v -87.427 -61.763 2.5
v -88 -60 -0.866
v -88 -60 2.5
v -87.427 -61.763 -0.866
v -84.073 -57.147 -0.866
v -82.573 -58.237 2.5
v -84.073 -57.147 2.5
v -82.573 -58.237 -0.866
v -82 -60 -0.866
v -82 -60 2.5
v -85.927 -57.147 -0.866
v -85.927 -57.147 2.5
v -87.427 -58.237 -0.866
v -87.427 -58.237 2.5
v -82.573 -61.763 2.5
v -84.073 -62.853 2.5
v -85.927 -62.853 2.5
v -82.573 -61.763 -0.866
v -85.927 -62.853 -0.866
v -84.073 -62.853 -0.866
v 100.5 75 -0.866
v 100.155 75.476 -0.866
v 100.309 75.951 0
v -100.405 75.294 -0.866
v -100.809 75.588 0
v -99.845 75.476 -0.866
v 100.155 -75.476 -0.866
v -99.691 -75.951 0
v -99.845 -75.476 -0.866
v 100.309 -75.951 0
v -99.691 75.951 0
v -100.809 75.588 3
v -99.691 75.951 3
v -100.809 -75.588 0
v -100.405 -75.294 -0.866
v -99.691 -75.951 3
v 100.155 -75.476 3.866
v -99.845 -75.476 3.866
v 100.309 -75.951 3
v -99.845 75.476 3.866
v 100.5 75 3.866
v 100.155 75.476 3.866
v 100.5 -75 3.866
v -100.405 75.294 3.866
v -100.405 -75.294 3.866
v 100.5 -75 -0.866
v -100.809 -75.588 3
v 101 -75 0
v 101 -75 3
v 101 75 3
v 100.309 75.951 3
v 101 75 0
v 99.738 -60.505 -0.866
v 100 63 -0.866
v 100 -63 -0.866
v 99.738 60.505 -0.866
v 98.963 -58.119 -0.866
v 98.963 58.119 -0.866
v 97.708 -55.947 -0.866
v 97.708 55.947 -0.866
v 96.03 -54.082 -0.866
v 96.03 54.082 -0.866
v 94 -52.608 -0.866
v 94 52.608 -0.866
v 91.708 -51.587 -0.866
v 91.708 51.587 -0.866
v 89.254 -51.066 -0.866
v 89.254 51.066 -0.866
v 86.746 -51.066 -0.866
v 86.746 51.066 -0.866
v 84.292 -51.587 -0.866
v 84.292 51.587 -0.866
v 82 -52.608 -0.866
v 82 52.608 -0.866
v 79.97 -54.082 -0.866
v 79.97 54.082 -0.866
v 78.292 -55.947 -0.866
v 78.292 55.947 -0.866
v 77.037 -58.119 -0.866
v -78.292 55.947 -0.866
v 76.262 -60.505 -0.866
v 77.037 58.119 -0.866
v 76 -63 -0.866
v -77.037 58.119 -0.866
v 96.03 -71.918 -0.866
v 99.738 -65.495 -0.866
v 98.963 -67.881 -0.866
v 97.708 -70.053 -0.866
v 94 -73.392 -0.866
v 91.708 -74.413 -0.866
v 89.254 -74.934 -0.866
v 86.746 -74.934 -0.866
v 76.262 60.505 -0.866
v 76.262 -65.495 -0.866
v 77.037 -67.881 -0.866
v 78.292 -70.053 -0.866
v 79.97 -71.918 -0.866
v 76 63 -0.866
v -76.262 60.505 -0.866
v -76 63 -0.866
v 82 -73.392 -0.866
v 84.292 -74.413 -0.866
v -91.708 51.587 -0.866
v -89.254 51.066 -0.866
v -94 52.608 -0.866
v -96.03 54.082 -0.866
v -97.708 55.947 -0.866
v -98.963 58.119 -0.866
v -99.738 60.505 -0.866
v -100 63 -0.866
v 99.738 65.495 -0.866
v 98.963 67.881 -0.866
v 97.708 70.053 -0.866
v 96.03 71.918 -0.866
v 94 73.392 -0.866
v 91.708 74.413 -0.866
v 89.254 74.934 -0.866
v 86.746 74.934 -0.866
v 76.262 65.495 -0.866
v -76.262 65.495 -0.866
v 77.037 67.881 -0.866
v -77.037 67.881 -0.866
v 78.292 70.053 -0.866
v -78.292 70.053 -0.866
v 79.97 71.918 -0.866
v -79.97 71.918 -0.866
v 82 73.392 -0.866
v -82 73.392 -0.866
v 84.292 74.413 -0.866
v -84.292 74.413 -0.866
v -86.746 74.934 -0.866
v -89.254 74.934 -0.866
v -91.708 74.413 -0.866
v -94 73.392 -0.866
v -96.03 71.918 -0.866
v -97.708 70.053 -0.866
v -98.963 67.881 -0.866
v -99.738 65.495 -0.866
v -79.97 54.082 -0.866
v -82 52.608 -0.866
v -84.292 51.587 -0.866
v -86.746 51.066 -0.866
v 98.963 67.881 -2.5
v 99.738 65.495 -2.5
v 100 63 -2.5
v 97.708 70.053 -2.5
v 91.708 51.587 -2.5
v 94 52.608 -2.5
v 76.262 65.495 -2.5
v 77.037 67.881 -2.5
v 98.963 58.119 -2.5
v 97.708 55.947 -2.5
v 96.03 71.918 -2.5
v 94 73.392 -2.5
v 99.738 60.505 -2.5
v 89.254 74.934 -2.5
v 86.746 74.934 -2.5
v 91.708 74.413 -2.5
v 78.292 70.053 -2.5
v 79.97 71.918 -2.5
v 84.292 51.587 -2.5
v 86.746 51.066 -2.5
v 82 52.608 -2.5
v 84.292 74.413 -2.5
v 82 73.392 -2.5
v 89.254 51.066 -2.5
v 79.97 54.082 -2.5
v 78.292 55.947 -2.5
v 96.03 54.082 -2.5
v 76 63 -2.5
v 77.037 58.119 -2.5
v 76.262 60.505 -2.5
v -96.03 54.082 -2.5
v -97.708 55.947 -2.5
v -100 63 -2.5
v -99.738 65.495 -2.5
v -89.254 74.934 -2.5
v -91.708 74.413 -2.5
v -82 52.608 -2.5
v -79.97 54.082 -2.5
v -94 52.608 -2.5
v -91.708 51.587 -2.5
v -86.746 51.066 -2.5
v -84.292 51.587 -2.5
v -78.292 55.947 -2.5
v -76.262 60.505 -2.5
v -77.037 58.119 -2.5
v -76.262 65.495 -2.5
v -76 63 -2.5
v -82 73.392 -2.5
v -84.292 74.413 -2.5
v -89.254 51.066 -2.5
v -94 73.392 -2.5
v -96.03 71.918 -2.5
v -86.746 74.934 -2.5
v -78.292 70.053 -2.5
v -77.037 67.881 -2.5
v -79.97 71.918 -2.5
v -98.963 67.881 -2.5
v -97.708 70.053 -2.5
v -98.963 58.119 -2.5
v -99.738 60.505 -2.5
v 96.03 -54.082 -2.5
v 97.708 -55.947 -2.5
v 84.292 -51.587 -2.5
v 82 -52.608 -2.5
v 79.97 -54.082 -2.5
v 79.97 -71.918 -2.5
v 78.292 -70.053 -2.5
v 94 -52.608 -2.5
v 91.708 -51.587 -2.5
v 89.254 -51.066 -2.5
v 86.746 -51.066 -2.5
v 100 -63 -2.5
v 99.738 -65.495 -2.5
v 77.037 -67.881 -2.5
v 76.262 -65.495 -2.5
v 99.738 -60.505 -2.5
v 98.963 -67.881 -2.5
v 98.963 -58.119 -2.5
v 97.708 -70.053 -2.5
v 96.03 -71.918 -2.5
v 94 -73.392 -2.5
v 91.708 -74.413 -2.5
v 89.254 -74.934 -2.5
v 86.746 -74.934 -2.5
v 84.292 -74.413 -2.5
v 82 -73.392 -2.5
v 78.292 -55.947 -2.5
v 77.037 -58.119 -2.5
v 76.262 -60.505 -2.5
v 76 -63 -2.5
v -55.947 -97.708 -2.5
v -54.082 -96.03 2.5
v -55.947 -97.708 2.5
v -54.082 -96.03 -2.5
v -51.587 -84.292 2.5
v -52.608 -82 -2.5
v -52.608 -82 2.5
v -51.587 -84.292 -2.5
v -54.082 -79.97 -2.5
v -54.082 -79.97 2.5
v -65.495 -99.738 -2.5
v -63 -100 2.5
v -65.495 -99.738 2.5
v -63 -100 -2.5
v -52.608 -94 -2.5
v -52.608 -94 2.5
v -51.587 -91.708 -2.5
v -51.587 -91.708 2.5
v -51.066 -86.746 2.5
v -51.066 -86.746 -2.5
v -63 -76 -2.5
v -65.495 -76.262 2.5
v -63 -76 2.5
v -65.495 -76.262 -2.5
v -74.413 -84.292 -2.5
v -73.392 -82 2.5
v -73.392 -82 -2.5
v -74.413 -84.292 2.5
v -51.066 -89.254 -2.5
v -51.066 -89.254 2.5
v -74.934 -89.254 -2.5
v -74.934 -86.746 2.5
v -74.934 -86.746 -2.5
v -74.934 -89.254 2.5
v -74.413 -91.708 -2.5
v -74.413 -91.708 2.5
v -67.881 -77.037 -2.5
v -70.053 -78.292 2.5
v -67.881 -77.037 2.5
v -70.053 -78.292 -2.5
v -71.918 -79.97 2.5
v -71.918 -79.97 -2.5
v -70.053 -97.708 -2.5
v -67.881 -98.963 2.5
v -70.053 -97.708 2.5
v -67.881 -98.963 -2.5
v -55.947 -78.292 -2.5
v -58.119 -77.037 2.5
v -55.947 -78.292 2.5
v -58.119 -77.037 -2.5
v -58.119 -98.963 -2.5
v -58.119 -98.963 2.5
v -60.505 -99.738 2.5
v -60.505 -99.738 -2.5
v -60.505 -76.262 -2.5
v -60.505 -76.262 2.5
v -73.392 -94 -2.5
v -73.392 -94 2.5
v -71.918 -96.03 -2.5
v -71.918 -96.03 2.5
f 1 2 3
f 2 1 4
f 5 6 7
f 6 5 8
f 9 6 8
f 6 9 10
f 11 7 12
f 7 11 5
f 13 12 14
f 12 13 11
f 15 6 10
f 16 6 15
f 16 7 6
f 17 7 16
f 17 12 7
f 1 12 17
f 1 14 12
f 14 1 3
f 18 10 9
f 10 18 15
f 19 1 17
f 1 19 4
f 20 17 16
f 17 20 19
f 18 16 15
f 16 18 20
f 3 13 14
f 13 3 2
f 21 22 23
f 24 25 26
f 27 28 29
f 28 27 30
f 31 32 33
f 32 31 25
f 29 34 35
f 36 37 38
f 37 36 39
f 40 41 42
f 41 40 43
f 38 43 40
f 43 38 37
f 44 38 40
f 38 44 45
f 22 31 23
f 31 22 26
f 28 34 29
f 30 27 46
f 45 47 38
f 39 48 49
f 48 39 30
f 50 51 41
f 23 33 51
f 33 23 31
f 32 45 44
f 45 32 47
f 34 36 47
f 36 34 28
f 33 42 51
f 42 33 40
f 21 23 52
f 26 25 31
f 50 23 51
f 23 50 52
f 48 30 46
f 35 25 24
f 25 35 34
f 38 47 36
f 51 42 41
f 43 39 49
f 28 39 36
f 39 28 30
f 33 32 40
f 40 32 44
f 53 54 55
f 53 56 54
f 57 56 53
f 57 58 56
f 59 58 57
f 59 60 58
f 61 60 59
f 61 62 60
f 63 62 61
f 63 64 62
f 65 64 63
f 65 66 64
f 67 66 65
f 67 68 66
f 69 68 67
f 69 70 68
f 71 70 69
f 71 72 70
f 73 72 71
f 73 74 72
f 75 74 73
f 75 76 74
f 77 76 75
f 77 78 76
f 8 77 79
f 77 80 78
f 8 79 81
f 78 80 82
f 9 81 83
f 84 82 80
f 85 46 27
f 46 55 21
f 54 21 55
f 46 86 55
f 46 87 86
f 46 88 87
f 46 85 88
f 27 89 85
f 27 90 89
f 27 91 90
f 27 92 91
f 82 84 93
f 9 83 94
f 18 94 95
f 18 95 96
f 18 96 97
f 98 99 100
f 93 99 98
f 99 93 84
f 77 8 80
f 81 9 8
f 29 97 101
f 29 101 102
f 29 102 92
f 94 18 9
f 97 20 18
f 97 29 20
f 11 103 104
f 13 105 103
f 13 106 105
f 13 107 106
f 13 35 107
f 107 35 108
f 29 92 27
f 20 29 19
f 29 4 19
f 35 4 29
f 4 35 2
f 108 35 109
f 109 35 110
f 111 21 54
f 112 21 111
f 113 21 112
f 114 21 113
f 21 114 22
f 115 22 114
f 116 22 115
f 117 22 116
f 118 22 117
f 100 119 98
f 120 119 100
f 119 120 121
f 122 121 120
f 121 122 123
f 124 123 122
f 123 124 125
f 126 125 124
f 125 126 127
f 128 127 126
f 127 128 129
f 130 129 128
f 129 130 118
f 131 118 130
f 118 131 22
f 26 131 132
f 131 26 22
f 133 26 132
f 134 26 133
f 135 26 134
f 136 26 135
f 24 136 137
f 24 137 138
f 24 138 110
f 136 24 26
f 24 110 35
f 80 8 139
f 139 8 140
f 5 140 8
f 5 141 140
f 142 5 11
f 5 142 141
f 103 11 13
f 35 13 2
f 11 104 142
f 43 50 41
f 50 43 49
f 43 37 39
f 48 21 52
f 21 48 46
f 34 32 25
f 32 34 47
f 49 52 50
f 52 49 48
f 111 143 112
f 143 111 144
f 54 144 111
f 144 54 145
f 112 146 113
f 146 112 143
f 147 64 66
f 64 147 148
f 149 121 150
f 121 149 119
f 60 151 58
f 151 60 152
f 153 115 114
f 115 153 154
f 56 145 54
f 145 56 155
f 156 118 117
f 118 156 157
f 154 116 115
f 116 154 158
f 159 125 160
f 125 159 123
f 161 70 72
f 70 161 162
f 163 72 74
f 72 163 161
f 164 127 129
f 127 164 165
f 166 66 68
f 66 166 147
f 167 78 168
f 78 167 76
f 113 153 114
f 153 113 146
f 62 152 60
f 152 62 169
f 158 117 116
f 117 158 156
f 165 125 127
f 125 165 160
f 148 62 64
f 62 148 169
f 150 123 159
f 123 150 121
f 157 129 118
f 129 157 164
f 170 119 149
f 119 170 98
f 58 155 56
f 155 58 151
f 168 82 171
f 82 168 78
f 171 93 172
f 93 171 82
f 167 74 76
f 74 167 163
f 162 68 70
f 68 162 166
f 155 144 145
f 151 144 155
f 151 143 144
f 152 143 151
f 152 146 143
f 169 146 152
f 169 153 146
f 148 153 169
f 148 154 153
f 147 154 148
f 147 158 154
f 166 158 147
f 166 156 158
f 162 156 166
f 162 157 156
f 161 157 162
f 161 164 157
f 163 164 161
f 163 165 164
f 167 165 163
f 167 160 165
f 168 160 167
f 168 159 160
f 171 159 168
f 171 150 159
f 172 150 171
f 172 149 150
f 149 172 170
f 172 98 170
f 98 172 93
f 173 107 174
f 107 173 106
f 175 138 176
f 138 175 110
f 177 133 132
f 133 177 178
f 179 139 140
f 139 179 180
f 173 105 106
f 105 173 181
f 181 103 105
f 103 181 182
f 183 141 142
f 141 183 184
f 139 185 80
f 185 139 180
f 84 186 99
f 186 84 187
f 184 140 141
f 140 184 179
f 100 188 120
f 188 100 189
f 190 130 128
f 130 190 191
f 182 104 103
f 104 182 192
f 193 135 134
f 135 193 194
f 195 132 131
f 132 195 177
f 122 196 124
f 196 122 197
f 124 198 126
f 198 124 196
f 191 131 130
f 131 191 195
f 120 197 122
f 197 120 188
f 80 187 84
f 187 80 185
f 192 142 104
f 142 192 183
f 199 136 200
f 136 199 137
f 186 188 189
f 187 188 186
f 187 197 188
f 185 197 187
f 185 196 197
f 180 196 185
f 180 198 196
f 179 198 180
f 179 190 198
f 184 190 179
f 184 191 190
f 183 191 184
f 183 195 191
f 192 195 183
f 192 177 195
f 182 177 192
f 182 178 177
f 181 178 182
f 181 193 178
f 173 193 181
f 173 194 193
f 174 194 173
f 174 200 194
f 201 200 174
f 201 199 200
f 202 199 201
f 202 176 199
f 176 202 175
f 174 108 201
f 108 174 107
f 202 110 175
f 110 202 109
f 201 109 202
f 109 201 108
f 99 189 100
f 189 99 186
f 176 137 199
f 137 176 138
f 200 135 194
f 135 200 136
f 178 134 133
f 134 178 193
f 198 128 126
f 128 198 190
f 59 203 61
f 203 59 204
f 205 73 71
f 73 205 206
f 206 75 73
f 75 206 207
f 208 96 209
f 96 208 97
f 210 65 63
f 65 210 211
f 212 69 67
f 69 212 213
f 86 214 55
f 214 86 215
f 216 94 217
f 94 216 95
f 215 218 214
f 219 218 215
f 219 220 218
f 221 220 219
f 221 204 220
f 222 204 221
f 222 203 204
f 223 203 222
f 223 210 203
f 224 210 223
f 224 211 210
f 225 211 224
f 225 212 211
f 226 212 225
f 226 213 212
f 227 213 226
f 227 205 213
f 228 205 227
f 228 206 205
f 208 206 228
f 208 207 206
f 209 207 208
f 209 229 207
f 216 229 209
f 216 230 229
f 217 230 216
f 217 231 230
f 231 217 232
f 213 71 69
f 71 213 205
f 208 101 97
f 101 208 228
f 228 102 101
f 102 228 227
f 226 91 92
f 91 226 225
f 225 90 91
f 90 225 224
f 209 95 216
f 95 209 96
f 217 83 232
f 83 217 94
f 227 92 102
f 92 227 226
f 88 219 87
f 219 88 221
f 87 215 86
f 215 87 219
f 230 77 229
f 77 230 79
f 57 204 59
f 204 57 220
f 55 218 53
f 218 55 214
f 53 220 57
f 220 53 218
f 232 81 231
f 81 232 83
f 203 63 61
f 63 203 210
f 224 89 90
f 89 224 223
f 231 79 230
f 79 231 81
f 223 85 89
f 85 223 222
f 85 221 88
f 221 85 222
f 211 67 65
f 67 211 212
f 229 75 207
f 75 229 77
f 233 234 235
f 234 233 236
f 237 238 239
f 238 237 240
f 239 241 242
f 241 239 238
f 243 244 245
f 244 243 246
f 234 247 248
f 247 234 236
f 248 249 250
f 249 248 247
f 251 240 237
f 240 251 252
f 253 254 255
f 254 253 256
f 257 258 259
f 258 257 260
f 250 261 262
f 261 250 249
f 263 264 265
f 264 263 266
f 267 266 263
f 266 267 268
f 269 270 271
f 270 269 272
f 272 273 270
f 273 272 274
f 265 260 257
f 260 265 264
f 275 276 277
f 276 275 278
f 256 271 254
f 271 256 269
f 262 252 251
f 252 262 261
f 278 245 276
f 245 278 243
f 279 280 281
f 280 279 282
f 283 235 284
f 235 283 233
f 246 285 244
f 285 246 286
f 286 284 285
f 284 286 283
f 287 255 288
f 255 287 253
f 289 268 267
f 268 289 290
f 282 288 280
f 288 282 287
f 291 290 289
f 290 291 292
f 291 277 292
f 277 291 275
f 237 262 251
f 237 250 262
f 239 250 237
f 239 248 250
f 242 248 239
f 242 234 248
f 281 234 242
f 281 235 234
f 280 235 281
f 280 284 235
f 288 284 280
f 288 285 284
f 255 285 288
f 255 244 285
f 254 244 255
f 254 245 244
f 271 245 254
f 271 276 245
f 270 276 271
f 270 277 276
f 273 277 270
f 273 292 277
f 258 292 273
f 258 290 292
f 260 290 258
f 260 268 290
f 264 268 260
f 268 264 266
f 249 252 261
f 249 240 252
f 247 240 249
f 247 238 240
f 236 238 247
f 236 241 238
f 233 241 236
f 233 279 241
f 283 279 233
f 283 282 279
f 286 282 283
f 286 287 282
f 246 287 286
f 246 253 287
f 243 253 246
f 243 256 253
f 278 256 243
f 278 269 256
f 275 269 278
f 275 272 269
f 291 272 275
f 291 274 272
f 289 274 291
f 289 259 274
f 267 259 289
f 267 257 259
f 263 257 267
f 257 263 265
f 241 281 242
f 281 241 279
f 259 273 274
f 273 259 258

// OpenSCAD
// Parameters
sheet_length = 200; //[100:400:1]
sheet_width = 150; //[75:300:1]
sheet_thickness = 3; //[1.5:6:0.5]
corner_radius = 12; //[6:24:1]
hole_diameter = 6; //[3:12:0.5]
hole_edge_offset = 15; //[8:30:1]
chamfer_size = 1; //[0.5:3:0.25]
connect_overlap = 1; //[0.5:2:0.1]

// Base Shapes
module sheet_body() {
  translate([0, 0, sheet_thickness / 2])
    cube([sheet_length, sheet_width, sheet_thickness], center = true);
}

module rounded_corner() {
  translate([sheet_length / 2 - corner_radius, sheet_width / 2 - corner_radius, 0])
    cylinder(r = corner_radius, h = sheet_thickness + 2 * connect_overlap, center = true);
}

module mounting_hole(x, y) {
  translate([x, y, 0])
    cylinder(r = hole_diameter / 2, h = sheet_thickness + 2 * connect_overlap, center = true);
}

module chamfer_kernel_sphere() {
  sphere(r = chamfer_size, center = true);
}

// Operations
module rounded_corners_union() {
  union() {
    rounded_corner();
    mirror([1, 0, 0]) rounded_corner();
    mirror([0, 1, 0]) rounded_corner();
    mirror([1, 1, 0]) rounded_corner();
  }
}

module sheet_with_rounded_corners() {
  minkowski() {
    sheet_body();
    chamfer_kernel_sphere();
  }
}

module mounting_holes() {
  union() {
    mounting_hole(sheet_length / 2 - hole_edge_offset, sheet_width / 2 - hole_edge_offset);
    mounting_hole(-sheet_length / 2 + hole_edge_offset, sheet_width / 2 - hole_edge_offset);
    mounting_hole(-sheet_length / 2 + hole_edge_offset, -sheet_width / 2 + hole_edge_offset);
    mounting_hole(sheet_length / 2 - hole_edge_offset, -sheet_width / 2 + hole_edge_offset);
  }
}

module sheet_minus_holes() {
  difference() {
    sheet_with_rounded_corners();
    mounting_holes();
  }
}

module chamfer_edges() {
  union() {
    sheet_minus_holes();
    rounded_corners_union();
  }
}

// Final Output
color("Silver") chamfer_edges();
